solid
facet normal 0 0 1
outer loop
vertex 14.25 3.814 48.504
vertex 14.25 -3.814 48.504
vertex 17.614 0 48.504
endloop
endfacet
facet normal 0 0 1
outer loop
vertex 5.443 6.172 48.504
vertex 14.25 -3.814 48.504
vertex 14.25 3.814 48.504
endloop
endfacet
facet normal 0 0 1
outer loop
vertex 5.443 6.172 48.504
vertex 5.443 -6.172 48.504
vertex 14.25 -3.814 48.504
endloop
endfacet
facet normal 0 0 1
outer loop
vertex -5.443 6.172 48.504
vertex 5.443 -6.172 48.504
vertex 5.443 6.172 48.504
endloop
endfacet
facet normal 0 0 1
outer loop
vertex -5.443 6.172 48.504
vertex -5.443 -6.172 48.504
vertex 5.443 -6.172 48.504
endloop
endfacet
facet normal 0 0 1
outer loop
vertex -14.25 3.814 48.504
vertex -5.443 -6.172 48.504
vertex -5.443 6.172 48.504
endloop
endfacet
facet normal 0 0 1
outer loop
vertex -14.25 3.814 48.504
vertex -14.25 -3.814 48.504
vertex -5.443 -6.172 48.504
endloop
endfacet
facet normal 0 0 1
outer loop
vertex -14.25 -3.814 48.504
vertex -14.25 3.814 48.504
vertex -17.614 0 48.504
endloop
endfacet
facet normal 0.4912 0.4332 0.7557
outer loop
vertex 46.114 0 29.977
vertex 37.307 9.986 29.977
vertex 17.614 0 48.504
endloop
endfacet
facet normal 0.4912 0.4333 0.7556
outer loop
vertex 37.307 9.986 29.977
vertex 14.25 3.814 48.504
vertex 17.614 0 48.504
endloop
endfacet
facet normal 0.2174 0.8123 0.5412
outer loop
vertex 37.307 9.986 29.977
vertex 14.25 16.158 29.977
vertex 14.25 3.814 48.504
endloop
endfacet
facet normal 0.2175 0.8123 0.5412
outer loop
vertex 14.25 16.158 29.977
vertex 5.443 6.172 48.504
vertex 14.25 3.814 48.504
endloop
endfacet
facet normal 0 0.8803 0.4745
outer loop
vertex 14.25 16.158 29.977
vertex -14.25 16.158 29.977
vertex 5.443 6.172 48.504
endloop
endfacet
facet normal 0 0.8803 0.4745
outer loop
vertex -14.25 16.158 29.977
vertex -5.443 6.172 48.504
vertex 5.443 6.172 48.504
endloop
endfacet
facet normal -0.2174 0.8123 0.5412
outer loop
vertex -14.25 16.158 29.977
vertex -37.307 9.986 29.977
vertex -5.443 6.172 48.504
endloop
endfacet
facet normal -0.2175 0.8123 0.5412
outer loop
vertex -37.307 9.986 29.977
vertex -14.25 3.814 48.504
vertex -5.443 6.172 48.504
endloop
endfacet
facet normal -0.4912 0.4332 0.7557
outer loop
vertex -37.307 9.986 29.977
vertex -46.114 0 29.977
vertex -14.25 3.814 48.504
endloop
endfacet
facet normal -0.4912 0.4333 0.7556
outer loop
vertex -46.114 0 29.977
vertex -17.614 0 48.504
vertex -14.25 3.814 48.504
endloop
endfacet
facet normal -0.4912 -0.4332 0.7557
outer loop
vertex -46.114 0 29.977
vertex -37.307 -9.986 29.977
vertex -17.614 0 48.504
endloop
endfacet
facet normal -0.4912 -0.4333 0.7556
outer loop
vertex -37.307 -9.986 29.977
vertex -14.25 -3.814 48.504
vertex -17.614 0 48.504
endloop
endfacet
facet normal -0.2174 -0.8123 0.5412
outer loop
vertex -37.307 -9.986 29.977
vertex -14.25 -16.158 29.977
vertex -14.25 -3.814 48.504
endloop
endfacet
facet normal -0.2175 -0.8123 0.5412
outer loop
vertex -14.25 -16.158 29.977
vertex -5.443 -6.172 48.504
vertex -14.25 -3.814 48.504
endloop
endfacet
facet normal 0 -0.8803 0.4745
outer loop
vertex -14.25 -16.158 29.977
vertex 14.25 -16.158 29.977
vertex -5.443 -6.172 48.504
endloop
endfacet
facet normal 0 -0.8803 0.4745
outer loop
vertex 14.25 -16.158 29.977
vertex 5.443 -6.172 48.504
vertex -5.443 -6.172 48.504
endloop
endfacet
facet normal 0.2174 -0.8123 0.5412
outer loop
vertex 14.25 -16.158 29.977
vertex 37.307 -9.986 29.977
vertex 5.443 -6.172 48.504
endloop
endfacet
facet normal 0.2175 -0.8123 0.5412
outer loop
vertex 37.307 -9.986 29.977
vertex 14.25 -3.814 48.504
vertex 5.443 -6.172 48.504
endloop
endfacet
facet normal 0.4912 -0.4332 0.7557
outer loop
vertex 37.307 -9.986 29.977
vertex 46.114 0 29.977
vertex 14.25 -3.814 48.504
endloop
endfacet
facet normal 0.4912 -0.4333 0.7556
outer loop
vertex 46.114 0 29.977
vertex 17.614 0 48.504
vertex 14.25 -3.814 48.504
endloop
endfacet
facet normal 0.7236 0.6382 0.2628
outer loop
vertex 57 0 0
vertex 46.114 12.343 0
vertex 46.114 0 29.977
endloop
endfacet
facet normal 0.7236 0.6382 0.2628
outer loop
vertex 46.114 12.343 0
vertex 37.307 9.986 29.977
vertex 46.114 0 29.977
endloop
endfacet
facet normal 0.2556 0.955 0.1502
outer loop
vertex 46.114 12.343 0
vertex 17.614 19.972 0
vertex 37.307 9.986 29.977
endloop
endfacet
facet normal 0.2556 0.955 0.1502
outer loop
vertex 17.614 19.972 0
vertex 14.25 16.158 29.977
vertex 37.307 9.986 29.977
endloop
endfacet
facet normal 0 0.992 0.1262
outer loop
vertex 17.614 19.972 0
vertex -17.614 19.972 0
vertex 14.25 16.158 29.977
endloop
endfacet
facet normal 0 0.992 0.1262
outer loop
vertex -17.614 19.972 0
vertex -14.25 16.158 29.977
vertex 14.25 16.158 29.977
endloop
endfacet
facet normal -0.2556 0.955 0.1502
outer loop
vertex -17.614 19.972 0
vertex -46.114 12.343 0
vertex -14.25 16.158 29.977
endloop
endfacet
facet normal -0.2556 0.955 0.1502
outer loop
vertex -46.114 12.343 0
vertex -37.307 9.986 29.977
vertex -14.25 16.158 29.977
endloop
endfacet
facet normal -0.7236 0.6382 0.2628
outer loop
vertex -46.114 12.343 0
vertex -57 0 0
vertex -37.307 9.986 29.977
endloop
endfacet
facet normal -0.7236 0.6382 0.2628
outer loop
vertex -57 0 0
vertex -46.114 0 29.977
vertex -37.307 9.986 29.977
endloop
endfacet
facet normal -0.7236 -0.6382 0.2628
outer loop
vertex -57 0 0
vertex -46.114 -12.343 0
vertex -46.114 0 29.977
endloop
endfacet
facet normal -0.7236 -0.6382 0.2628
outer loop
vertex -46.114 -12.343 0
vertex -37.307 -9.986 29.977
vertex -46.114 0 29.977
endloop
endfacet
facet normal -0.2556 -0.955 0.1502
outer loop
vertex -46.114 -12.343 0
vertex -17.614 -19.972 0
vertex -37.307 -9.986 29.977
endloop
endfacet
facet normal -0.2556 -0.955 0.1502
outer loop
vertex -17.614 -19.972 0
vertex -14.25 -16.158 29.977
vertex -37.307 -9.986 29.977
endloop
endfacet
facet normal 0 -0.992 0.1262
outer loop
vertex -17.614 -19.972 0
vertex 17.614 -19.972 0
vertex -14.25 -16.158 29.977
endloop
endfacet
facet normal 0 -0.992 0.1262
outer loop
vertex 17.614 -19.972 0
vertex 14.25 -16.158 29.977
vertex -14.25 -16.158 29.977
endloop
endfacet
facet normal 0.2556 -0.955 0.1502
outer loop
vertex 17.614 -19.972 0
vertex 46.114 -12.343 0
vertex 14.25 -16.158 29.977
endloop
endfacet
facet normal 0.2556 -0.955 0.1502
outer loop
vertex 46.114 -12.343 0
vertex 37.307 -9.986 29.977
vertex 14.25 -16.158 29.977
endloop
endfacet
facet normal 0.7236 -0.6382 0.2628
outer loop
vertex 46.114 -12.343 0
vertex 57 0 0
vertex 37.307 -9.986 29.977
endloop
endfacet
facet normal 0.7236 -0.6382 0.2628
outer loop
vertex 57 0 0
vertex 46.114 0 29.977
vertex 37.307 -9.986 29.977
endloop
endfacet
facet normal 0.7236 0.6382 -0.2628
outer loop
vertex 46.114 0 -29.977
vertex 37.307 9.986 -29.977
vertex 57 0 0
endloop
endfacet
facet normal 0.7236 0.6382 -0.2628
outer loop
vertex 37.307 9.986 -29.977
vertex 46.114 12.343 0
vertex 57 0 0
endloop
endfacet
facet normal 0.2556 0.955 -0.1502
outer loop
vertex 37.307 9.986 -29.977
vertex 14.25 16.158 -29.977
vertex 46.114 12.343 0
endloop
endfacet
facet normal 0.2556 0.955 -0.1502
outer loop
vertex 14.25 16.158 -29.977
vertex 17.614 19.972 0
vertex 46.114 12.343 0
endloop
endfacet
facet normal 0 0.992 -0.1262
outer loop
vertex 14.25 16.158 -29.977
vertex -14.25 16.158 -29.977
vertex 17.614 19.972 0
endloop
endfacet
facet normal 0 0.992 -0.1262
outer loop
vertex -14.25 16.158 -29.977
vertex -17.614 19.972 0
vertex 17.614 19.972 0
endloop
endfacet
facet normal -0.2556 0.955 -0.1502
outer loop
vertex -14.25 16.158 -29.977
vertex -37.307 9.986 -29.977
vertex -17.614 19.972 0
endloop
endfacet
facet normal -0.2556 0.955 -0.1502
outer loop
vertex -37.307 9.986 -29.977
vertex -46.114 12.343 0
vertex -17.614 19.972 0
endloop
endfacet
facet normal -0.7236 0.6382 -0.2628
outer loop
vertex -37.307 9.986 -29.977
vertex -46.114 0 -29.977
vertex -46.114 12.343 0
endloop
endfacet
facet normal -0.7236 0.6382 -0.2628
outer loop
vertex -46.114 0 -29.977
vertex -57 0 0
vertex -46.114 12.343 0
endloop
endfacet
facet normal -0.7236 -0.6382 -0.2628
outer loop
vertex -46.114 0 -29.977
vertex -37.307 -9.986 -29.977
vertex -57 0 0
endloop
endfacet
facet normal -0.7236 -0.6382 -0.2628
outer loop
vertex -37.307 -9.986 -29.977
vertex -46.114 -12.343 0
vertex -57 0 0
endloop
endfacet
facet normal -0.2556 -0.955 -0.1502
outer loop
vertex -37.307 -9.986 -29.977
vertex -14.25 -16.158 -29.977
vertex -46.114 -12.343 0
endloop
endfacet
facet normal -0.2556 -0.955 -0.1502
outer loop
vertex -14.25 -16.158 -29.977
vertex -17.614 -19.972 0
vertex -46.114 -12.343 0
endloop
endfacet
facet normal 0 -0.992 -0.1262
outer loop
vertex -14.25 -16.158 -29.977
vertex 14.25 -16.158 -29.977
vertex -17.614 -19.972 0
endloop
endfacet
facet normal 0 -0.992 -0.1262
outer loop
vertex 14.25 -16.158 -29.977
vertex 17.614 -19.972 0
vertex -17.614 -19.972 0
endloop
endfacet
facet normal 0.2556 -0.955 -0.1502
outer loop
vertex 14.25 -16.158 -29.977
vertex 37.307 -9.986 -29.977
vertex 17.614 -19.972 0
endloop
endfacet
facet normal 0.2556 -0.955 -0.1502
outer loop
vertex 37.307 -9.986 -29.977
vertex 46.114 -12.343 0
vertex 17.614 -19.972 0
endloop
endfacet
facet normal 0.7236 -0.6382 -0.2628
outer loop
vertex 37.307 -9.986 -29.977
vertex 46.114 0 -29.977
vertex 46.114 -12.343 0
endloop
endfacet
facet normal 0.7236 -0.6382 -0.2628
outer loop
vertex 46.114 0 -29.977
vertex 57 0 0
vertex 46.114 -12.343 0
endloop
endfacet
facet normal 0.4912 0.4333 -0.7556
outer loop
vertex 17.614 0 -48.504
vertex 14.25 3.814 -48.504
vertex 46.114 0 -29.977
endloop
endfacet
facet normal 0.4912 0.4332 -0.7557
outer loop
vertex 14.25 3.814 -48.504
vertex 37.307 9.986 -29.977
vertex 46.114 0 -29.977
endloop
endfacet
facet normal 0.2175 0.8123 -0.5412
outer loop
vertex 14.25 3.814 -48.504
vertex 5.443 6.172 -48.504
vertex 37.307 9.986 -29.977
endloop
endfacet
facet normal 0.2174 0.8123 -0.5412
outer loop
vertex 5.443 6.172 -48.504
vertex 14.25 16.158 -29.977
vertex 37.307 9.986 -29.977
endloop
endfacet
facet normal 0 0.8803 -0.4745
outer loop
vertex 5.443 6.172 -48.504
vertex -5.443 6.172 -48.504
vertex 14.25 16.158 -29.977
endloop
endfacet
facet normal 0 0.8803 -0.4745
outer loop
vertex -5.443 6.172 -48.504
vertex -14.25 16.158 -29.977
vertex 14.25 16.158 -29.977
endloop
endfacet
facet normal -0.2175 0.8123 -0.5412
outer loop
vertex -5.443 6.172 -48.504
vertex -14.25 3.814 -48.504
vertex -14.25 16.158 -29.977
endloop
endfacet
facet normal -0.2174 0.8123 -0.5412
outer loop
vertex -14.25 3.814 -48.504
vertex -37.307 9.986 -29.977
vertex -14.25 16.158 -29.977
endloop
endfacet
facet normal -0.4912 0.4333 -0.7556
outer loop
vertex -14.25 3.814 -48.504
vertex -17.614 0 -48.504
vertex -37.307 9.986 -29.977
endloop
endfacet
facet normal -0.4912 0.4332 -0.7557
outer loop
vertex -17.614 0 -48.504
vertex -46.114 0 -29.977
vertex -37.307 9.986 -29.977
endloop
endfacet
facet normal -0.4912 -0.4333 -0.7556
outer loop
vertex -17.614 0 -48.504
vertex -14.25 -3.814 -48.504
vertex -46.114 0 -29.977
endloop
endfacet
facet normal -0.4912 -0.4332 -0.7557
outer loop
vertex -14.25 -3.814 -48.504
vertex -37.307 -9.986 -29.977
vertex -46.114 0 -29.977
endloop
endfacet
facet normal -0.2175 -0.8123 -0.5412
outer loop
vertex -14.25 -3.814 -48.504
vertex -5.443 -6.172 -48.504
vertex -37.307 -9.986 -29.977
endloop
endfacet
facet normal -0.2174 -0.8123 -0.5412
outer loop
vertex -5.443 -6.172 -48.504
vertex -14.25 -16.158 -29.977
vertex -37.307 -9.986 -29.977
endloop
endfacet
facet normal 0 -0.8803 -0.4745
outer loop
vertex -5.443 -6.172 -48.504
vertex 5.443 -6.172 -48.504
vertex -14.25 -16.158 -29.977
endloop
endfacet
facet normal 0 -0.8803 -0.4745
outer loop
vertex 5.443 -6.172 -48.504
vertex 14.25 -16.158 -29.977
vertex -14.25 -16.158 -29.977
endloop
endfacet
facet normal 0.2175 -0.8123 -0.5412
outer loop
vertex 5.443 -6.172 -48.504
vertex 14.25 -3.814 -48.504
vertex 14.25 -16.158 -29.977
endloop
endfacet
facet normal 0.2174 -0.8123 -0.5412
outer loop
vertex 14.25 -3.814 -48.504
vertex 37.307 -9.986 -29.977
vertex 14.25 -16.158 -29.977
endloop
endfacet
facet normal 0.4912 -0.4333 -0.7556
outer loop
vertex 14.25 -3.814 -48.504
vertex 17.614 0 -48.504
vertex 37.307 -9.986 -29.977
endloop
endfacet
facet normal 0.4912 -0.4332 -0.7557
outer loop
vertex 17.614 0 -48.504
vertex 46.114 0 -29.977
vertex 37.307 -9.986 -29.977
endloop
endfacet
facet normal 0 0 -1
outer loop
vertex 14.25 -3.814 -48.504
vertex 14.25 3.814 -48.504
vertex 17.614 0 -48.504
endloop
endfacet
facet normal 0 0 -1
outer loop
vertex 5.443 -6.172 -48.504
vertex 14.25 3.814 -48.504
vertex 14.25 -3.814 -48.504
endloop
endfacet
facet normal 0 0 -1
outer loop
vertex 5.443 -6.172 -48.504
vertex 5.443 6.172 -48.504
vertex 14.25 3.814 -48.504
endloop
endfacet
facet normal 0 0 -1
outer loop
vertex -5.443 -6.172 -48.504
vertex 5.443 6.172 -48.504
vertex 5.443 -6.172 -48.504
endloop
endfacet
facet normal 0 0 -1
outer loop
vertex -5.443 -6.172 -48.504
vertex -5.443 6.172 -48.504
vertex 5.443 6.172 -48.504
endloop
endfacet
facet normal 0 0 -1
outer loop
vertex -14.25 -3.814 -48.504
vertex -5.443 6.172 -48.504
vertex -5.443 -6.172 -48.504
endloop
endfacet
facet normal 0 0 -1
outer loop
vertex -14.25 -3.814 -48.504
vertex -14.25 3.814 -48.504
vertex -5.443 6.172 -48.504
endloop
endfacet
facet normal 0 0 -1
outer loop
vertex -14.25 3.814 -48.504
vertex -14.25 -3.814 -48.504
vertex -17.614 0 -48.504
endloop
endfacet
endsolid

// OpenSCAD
// Generated by SolidPython 1.0.1 on 2020-07-29 00:46:53


scale(v = [19, 7, 17]) {
	sphere(r = 3);
}
/***********************************************
*********      SolidPython code:      **********
************************************************
 
# import packages: SolidPython
from solid import *
from solid.utils import *
from itertools import chain, combinations, permutations


class Resize:

    def __init__(self, scad_file):
        self.scad_file = scad_file
        #self.scad_file = import_scad(scad_file)
        # cone/cylinder param:
        self.r1 = 0
        self.r2 = 0
        self.h = 0
        # rectangular prism param:
        self.w = 0
        self.l = 0
        # ellipse param:
        self.r = 0

    # import OpenScad code (file name corresponds to shape)


    # classify shape + parameters
    def assign(self, param1, param2, param3):
        if self.scad_file == 'cone.scad':
            self.r1 = param1
            self.r2 = param2
            self.h = param3
        elif self.scad_file == 'cylinder.scad':
            self.r1 = param1
            self.r2 = param2
            self.h = param3
        elif self.scad_file == 'rectangularPrism.scad':
            self.h = param1
            self.l = param2
            self.w = param3
        else:
            self.r = param1
            self.h = param2

    # resize parameters
    def iterate(self):
        x = range(3, 20, 2)
        i = 1
        if self.scad_file == 'cone.scad':
            tempList = list(permutations(x, 2))
            for temp in tempList:
                param1 = temp[0]
                param2 = temp[1]
                filepath = 'produced_scad_files/' + 'cone' + str(param1) + '_' + str(param2) + '_' + '.scad'
                scad_render_to_file(cylinder(h=param1, r1=param2, r2=0), filepath)

        elif self.scad_file == 'cylinder.scad':
            tempList = list(permutations(x, 3))
            for temp in tempList:
                param1 = temp[0]
                param2 = temp[1]
                filepath = 'produced_scad_files/' + 'cylinder' + str(param1) + '_' + str(param2) + '_' + '.scad'
                scad_render_to_file(cylinder(h=param1, r1=param2, r2=param2), filepath)

        elif self.scad_file == 'rectangularPrism.scad':
            tempList = list(permutations(x, 3))
            for temp in tempList:
                param1 = temp[0]
                param2 = temp[1]
                param3 = temp[2]
                filepath = 'produced_scad_files/' + 'rectangularPrism' + str(param1) + '_' + str(param2) + '_' + str(
                    param3) + '.scad'
                scad_render_to_file(cube(size=(param1, param2, param3)), filepath)

        elif self.scad_file == 'ellipse.scad':
            tempList = list(permutations(x, 4))
            for temp in tempList:
                param1 = temp[0]
                param2 = temp[1]
                param3 = temp[2]
                param4 = temp[3]
                filepath = 'produced_scad_files/' + 'ellipse' + str(param1) + '_' + str(param2) + '_' + str(param3) + '_' + str(param4) + '.scad'
                scad_render_to_file(scale([param1, param2, param3])(sphere(r=param4)), filepath)

    def render_to_scadfile(self):
        scad_render_to_file(scad, 'example.scad') 
 
************************************************/
